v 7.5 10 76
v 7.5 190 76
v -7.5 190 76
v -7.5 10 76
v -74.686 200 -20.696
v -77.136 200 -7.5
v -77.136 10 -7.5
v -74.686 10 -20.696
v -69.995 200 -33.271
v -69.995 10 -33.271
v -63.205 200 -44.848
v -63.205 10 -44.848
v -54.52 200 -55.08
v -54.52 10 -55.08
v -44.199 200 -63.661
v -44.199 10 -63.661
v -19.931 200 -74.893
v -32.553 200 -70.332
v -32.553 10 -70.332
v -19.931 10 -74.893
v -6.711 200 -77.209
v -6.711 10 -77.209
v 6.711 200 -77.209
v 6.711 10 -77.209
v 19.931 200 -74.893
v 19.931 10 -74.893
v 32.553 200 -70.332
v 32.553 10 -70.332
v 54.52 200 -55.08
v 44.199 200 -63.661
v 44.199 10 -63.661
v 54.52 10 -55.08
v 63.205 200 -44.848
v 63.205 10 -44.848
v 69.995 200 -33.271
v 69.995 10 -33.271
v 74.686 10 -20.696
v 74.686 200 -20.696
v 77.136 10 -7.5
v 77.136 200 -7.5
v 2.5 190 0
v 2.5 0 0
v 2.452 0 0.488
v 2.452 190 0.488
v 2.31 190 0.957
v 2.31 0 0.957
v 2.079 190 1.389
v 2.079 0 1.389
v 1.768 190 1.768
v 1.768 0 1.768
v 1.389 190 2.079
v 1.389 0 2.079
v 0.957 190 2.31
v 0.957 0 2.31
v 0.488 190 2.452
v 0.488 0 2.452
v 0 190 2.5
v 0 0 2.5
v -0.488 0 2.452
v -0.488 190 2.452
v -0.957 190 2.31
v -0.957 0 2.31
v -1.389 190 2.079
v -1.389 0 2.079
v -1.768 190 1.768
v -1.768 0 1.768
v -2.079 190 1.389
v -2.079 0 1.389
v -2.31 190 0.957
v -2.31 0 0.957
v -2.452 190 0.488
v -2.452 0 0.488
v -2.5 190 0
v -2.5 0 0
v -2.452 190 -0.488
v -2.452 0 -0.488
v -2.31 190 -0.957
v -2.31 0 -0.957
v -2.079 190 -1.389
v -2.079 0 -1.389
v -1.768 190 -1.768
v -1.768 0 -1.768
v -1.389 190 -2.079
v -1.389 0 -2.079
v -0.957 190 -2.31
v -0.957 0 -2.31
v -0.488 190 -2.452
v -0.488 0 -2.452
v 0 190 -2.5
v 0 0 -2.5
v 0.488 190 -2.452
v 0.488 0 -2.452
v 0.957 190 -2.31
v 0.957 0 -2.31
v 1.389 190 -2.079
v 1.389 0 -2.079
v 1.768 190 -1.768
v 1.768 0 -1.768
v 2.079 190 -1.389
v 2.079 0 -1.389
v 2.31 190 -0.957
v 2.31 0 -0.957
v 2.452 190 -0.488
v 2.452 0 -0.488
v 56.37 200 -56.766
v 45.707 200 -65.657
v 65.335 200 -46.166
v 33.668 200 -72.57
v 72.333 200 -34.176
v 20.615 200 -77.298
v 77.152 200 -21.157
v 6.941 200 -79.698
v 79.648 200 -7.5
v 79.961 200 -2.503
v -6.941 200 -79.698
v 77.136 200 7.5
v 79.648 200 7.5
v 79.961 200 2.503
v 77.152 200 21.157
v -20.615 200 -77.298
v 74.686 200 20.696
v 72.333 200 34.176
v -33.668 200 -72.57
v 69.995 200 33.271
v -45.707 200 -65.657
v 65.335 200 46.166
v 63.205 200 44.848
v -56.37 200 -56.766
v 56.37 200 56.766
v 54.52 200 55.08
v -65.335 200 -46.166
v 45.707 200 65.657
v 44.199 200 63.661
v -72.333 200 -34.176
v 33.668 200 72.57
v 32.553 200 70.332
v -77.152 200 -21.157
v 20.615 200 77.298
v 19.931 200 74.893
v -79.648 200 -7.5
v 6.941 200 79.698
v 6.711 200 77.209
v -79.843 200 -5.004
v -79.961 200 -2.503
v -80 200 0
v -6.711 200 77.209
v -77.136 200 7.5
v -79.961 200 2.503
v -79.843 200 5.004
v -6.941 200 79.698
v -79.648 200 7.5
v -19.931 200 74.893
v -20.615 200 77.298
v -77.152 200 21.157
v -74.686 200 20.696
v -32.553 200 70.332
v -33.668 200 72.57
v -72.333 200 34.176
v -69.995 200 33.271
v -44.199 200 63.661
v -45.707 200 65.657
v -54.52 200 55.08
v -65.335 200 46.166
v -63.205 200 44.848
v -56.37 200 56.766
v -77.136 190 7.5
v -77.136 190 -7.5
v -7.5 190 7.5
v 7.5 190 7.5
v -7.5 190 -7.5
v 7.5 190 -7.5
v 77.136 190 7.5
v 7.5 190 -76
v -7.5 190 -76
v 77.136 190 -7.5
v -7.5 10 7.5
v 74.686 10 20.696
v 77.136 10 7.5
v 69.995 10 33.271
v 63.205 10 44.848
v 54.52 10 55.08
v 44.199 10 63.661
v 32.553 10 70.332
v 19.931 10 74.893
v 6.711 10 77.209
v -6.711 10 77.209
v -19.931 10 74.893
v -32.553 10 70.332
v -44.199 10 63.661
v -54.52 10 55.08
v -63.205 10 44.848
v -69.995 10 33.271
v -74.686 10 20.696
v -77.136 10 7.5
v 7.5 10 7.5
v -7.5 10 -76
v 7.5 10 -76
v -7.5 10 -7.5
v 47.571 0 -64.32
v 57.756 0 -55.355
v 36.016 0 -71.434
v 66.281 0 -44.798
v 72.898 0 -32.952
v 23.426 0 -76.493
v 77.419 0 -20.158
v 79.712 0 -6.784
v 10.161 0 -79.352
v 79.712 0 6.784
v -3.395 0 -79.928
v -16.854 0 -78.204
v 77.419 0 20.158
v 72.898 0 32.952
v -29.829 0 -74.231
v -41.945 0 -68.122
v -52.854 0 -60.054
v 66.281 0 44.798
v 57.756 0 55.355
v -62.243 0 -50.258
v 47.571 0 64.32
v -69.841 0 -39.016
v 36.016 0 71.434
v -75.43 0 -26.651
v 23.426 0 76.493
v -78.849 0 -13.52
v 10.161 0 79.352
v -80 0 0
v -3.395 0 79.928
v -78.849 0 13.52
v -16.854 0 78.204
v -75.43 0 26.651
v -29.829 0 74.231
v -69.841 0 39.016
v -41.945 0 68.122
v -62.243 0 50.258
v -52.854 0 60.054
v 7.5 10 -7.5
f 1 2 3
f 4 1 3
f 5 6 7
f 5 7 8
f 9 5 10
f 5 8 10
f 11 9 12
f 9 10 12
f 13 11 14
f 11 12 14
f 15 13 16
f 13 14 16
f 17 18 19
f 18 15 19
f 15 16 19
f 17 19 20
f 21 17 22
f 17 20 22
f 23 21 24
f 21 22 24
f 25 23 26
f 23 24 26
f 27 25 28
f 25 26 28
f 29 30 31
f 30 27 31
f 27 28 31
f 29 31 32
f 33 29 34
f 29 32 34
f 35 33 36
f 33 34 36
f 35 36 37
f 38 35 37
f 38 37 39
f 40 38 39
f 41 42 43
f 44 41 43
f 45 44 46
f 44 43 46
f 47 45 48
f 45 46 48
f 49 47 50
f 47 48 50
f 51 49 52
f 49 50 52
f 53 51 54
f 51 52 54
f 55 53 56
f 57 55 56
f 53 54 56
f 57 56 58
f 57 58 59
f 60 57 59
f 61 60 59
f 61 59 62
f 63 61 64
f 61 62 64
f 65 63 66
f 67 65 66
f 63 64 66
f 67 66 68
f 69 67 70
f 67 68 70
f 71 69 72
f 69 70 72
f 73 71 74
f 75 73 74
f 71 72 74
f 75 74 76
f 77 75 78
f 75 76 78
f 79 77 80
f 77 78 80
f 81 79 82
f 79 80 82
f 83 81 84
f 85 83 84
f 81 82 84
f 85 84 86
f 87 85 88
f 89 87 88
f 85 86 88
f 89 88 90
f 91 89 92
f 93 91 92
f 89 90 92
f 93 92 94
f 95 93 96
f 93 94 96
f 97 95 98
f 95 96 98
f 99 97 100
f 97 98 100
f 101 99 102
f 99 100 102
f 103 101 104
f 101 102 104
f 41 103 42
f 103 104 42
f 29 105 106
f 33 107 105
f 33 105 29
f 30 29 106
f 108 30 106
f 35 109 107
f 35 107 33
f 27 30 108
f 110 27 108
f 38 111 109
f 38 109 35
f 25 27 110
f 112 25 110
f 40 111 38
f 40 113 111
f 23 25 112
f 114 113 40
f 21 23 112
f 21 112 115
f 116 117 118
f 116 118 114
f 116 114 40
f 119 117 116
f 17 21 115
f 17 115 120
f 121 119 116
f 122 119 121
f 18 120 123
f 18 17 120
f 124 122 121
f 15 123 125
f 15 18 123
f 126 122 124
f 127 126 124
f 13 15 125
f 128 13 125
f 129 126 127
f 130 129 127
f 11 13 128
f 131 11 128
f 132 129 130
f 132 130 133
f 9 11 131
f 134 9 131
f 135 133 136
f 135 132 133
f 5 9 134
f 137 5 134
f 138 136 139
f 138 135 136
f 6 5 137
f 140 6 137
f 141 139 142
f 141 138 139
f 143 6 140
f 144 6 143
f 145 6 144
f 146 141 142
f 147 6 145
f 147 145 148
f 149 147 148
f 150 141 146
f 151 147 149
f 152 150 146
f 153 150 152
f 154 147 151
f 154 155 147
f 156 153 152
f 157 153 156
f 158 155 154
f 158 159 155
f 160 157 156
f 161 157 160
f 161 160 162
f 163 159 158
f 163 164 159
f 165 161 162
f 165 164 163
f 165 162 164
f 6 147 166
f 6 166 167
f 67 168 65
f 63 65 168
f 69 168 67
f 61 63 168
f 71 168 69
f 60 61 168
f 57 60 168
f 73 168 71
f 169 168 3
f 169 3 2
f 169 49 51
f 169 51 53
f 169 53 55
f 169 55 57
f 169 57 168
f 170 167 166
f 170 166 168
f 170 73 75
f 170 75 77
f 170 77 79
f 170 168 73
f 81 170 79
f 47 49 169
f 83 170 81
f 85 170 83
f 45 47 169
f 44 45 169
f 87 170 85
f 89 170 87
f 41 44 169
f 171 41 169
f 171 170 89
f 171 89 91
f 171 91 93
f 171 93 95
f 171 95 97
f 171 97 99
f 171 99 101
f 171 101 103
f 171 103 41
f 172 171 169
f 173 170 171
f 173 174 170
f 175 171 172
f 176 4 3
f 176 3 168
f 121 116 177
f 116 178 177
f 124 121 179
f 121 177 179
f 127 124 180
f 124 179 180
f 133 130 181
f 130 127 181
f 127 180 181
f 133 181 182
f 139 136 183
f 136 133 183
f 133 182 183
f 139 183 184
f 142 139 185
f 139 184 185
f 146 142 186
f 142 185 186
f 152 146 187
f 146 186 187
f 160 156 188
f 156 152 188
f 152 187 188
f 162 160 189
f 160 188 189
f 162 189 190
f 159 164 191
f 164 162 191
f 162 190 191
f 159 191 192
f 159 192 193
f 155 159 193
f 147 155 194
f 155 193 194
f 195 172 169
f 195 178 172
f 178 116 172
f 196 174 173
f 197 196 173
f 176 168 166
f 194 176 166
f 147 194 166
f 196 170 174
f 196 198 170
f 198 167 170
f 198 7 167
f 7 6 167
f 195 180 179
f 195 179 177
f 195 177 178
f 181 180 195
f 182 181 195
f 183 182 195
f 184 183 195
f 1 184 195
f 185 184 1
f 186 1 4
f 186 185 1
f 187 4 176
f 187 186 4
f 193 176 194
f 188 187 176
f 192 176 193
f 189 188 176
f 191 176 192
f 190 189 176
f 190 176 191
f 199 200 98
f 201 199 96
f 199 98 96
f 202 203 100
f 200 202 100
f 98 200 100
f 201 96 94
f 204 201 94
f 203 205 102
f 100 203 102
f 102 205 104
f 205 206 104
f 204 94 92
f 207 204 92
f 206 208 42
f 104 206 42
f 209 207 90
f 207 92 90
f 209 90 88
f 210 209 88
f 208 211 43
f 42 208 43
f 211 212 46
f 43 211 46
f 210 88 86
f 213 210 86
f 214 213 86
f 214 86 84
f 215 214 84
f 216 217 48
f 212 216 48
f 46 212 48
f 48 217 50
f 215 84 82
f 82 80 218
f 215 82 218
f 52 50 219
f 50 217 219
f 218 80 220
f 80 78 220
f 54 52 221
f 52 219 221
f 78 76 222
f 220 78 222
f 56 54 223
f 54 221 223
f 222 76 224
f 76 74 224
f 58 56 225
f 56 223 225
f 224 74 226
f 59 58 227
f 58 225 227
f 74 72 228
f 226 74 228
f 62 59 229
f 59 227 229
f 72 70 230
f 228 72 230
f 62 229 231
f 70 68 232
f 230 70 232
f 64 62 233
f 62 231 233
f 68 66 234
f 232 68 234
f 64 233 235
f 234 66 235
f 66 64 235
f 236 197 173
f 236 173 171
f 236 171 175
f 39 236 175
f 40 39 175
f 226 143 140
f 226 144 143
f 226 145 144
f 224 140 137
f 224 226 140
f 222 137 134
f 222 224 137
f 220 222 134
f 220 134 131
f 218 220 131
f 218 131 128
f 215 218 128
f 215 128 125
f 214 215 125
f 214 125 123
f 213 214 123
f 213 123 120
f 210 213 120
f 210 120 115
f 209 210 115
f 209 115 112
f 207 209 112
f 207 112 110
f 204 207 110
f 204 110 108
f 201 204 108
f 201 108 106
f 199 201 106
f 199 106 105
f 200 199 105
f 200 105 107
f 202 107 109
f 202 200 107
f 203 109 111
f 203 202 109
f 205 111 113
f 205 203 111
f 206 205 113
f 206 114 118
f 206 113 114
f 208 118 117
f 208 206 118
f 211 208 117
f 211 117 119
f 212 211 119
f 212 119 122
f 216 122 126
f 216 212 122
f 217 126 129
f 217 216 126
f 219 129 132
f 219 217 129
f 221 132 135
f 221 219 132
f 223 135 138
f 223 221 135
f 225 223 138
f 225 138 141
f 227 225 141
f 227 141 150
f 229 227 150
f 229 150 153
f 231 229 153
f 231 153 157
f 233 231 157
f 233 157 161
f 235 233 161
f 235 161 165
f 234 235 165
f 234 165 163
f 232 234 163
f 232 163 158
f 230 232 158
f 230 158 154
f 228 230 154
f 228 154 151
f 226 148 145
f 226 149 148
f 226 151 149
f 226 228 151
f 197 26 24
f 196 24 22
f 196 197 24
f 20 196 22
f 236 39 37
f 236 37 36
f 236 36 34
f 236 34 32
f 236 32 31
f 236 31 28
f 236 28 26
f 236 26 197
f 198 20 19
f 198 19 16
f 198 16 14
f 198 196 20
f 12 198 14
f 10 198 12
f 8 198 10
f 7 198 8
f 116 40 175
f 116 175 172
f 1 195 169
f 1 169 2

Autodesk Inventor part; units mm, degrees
ref_plane "XZ Plane" through (0, 0, 0) normal (0, 1, 0) x (-1, 0, 0)
ref_plane "Work Plane1" through (0, 0, 0) normal (1, 0, 0) x (0, 1, 0)
ref_plane "Work Plane2" through (0, 0, 0) normal (0, 0, 1) x (1, 0, 0)
sketch "Sketch1" plane through (0, 0, 0) normal (0, 1, 0) x (-1, 0, 0)
  circle A0 centre (0, 0) radius 80
  circle A1 centre (0, 0) radius 77.5
  dimension "d0" = 160
  dimension "d1" = 155
extrude "Extrusion1" add sketch "Sketch1" along normal blind 200
sketch "Sketch2" plane through (0, 0, 0) normal (0, 1, 0) x (-1, 0, 0)
  circle A0 centre (0, 0) radius 77.5
  dimension "d4" = 155
extrude "Extrusion2" add sketch "Sketch2" along normal blind 10
sketch "Sketch3" plane through (0, 10, 0) normal (0, 1, 0) x (1, 0, 0)
  circle A0 centre (0, 0) radius 80 projected
  line L0 (79.6477, -7.5) -> (-79.6477, -7.5)
  line L1 (-79.6477, -7.5) -> (-79.6477, 7.5)
  line L2 (-79.6477, 7.5) -> (79.6477, 7.5)
  line L3 (79.6477, 7.5) -> (79.6477, -7.5)
  line L4 (79.6477, -7.5) -> (-79.6477, 7.5) construction
  line L5 (-79.6477, -7.5) -> (79.6477, 7.5) construction
  line L6 (7.5, -76) -> (-7.5, -76)
  line L7 (-7.5, -76) -> (-7.5, 76)
  line L8 (-7.5, 76) -> (7.5, 76)
  line L9 (7.5, 76) -> (7.5, -76)
  line L10 (7.5, -76) -> (-7.5, 76) construction
  line L11 (-7.5, -76) -> (7.5, 76) construction
  point P0 (-7.5, 7.5)
  point P1 (-7.5, -7.5)
  point P2 (7.5, -7.5)
  point P3 (7.5, 7.5)
  dimension "d7" = 15
  dimension "d8" = 15
  dimension "d9" = 152
extrude "Extrusion3" add sketch "Sketch3" along normal blind 190 contours L3 L0 L9 L2 | L2 L7 L0 L1 | L9 L0 L7 L2 | L2 L7 L8 L9 | L9 L6 L7 L0
sketch "Sketch4" plane through (0, 0, 0) normal (0, -1, 0) x (1, 0, 0)
  circle A0 centre (0, 0) radius 2.5
  dimension "d14" = 5
extrude "Extrusion4" cut sketch "Sketch4" against normal blind 190
sketch "Sketch5" plane through (0, 200, 0) normal (0, 1, 0) x (1, 0, 0)
  line L0 (7.5, 76) -> (7.5, 7.5) projected
  line L1 (-7.5, -76) -> (7.5, -76)
  line L2 (7.5, -76) -> (7.5, 76)
  line L3 (7.5, 76) -> (-7.5, 76)
  line L4 (-7.5, 76) -> (-7.5, -76)
  circle A0 centre (0, 0) radius 2.5 projected
  line L5 (-7.5, -76) -> (7.5, 76) construction
  line L6 (7.5, -76) -> (-7.5, 76) construction
  line L7 (-77.1362, 7.5) -> (77.1362, 7.5)
  line L8 (77.1362, 7.5) -> (77.1362, -7.5)
  line L9 (77.1362, -7.5) -> (-77.1362, -7.5)
  line L10 (-77.1362, -7.5) -> (-77.1362, 7.5)
  line L11 (-77.1362, 7.5) -> (77.1362, -7.5) construction
  line L12 (77.1362, 7.5) -> (-77.1362, -7.5) construction
  point P0 (-7.5, 7.5)
  point P1 (-7.5, -7.5)
  point P2 (7.5, -7.5)
extrude "Extrusion5" cut sketch "Sketch5" against normal blind 10 contours L0 L7 L4 L3 | L7 L8 L9 L2 | L2 L9 L4 L7 | L2 L1 L4 L9 | L4 L9 L10 L7 | A0
properties part number "aa"
